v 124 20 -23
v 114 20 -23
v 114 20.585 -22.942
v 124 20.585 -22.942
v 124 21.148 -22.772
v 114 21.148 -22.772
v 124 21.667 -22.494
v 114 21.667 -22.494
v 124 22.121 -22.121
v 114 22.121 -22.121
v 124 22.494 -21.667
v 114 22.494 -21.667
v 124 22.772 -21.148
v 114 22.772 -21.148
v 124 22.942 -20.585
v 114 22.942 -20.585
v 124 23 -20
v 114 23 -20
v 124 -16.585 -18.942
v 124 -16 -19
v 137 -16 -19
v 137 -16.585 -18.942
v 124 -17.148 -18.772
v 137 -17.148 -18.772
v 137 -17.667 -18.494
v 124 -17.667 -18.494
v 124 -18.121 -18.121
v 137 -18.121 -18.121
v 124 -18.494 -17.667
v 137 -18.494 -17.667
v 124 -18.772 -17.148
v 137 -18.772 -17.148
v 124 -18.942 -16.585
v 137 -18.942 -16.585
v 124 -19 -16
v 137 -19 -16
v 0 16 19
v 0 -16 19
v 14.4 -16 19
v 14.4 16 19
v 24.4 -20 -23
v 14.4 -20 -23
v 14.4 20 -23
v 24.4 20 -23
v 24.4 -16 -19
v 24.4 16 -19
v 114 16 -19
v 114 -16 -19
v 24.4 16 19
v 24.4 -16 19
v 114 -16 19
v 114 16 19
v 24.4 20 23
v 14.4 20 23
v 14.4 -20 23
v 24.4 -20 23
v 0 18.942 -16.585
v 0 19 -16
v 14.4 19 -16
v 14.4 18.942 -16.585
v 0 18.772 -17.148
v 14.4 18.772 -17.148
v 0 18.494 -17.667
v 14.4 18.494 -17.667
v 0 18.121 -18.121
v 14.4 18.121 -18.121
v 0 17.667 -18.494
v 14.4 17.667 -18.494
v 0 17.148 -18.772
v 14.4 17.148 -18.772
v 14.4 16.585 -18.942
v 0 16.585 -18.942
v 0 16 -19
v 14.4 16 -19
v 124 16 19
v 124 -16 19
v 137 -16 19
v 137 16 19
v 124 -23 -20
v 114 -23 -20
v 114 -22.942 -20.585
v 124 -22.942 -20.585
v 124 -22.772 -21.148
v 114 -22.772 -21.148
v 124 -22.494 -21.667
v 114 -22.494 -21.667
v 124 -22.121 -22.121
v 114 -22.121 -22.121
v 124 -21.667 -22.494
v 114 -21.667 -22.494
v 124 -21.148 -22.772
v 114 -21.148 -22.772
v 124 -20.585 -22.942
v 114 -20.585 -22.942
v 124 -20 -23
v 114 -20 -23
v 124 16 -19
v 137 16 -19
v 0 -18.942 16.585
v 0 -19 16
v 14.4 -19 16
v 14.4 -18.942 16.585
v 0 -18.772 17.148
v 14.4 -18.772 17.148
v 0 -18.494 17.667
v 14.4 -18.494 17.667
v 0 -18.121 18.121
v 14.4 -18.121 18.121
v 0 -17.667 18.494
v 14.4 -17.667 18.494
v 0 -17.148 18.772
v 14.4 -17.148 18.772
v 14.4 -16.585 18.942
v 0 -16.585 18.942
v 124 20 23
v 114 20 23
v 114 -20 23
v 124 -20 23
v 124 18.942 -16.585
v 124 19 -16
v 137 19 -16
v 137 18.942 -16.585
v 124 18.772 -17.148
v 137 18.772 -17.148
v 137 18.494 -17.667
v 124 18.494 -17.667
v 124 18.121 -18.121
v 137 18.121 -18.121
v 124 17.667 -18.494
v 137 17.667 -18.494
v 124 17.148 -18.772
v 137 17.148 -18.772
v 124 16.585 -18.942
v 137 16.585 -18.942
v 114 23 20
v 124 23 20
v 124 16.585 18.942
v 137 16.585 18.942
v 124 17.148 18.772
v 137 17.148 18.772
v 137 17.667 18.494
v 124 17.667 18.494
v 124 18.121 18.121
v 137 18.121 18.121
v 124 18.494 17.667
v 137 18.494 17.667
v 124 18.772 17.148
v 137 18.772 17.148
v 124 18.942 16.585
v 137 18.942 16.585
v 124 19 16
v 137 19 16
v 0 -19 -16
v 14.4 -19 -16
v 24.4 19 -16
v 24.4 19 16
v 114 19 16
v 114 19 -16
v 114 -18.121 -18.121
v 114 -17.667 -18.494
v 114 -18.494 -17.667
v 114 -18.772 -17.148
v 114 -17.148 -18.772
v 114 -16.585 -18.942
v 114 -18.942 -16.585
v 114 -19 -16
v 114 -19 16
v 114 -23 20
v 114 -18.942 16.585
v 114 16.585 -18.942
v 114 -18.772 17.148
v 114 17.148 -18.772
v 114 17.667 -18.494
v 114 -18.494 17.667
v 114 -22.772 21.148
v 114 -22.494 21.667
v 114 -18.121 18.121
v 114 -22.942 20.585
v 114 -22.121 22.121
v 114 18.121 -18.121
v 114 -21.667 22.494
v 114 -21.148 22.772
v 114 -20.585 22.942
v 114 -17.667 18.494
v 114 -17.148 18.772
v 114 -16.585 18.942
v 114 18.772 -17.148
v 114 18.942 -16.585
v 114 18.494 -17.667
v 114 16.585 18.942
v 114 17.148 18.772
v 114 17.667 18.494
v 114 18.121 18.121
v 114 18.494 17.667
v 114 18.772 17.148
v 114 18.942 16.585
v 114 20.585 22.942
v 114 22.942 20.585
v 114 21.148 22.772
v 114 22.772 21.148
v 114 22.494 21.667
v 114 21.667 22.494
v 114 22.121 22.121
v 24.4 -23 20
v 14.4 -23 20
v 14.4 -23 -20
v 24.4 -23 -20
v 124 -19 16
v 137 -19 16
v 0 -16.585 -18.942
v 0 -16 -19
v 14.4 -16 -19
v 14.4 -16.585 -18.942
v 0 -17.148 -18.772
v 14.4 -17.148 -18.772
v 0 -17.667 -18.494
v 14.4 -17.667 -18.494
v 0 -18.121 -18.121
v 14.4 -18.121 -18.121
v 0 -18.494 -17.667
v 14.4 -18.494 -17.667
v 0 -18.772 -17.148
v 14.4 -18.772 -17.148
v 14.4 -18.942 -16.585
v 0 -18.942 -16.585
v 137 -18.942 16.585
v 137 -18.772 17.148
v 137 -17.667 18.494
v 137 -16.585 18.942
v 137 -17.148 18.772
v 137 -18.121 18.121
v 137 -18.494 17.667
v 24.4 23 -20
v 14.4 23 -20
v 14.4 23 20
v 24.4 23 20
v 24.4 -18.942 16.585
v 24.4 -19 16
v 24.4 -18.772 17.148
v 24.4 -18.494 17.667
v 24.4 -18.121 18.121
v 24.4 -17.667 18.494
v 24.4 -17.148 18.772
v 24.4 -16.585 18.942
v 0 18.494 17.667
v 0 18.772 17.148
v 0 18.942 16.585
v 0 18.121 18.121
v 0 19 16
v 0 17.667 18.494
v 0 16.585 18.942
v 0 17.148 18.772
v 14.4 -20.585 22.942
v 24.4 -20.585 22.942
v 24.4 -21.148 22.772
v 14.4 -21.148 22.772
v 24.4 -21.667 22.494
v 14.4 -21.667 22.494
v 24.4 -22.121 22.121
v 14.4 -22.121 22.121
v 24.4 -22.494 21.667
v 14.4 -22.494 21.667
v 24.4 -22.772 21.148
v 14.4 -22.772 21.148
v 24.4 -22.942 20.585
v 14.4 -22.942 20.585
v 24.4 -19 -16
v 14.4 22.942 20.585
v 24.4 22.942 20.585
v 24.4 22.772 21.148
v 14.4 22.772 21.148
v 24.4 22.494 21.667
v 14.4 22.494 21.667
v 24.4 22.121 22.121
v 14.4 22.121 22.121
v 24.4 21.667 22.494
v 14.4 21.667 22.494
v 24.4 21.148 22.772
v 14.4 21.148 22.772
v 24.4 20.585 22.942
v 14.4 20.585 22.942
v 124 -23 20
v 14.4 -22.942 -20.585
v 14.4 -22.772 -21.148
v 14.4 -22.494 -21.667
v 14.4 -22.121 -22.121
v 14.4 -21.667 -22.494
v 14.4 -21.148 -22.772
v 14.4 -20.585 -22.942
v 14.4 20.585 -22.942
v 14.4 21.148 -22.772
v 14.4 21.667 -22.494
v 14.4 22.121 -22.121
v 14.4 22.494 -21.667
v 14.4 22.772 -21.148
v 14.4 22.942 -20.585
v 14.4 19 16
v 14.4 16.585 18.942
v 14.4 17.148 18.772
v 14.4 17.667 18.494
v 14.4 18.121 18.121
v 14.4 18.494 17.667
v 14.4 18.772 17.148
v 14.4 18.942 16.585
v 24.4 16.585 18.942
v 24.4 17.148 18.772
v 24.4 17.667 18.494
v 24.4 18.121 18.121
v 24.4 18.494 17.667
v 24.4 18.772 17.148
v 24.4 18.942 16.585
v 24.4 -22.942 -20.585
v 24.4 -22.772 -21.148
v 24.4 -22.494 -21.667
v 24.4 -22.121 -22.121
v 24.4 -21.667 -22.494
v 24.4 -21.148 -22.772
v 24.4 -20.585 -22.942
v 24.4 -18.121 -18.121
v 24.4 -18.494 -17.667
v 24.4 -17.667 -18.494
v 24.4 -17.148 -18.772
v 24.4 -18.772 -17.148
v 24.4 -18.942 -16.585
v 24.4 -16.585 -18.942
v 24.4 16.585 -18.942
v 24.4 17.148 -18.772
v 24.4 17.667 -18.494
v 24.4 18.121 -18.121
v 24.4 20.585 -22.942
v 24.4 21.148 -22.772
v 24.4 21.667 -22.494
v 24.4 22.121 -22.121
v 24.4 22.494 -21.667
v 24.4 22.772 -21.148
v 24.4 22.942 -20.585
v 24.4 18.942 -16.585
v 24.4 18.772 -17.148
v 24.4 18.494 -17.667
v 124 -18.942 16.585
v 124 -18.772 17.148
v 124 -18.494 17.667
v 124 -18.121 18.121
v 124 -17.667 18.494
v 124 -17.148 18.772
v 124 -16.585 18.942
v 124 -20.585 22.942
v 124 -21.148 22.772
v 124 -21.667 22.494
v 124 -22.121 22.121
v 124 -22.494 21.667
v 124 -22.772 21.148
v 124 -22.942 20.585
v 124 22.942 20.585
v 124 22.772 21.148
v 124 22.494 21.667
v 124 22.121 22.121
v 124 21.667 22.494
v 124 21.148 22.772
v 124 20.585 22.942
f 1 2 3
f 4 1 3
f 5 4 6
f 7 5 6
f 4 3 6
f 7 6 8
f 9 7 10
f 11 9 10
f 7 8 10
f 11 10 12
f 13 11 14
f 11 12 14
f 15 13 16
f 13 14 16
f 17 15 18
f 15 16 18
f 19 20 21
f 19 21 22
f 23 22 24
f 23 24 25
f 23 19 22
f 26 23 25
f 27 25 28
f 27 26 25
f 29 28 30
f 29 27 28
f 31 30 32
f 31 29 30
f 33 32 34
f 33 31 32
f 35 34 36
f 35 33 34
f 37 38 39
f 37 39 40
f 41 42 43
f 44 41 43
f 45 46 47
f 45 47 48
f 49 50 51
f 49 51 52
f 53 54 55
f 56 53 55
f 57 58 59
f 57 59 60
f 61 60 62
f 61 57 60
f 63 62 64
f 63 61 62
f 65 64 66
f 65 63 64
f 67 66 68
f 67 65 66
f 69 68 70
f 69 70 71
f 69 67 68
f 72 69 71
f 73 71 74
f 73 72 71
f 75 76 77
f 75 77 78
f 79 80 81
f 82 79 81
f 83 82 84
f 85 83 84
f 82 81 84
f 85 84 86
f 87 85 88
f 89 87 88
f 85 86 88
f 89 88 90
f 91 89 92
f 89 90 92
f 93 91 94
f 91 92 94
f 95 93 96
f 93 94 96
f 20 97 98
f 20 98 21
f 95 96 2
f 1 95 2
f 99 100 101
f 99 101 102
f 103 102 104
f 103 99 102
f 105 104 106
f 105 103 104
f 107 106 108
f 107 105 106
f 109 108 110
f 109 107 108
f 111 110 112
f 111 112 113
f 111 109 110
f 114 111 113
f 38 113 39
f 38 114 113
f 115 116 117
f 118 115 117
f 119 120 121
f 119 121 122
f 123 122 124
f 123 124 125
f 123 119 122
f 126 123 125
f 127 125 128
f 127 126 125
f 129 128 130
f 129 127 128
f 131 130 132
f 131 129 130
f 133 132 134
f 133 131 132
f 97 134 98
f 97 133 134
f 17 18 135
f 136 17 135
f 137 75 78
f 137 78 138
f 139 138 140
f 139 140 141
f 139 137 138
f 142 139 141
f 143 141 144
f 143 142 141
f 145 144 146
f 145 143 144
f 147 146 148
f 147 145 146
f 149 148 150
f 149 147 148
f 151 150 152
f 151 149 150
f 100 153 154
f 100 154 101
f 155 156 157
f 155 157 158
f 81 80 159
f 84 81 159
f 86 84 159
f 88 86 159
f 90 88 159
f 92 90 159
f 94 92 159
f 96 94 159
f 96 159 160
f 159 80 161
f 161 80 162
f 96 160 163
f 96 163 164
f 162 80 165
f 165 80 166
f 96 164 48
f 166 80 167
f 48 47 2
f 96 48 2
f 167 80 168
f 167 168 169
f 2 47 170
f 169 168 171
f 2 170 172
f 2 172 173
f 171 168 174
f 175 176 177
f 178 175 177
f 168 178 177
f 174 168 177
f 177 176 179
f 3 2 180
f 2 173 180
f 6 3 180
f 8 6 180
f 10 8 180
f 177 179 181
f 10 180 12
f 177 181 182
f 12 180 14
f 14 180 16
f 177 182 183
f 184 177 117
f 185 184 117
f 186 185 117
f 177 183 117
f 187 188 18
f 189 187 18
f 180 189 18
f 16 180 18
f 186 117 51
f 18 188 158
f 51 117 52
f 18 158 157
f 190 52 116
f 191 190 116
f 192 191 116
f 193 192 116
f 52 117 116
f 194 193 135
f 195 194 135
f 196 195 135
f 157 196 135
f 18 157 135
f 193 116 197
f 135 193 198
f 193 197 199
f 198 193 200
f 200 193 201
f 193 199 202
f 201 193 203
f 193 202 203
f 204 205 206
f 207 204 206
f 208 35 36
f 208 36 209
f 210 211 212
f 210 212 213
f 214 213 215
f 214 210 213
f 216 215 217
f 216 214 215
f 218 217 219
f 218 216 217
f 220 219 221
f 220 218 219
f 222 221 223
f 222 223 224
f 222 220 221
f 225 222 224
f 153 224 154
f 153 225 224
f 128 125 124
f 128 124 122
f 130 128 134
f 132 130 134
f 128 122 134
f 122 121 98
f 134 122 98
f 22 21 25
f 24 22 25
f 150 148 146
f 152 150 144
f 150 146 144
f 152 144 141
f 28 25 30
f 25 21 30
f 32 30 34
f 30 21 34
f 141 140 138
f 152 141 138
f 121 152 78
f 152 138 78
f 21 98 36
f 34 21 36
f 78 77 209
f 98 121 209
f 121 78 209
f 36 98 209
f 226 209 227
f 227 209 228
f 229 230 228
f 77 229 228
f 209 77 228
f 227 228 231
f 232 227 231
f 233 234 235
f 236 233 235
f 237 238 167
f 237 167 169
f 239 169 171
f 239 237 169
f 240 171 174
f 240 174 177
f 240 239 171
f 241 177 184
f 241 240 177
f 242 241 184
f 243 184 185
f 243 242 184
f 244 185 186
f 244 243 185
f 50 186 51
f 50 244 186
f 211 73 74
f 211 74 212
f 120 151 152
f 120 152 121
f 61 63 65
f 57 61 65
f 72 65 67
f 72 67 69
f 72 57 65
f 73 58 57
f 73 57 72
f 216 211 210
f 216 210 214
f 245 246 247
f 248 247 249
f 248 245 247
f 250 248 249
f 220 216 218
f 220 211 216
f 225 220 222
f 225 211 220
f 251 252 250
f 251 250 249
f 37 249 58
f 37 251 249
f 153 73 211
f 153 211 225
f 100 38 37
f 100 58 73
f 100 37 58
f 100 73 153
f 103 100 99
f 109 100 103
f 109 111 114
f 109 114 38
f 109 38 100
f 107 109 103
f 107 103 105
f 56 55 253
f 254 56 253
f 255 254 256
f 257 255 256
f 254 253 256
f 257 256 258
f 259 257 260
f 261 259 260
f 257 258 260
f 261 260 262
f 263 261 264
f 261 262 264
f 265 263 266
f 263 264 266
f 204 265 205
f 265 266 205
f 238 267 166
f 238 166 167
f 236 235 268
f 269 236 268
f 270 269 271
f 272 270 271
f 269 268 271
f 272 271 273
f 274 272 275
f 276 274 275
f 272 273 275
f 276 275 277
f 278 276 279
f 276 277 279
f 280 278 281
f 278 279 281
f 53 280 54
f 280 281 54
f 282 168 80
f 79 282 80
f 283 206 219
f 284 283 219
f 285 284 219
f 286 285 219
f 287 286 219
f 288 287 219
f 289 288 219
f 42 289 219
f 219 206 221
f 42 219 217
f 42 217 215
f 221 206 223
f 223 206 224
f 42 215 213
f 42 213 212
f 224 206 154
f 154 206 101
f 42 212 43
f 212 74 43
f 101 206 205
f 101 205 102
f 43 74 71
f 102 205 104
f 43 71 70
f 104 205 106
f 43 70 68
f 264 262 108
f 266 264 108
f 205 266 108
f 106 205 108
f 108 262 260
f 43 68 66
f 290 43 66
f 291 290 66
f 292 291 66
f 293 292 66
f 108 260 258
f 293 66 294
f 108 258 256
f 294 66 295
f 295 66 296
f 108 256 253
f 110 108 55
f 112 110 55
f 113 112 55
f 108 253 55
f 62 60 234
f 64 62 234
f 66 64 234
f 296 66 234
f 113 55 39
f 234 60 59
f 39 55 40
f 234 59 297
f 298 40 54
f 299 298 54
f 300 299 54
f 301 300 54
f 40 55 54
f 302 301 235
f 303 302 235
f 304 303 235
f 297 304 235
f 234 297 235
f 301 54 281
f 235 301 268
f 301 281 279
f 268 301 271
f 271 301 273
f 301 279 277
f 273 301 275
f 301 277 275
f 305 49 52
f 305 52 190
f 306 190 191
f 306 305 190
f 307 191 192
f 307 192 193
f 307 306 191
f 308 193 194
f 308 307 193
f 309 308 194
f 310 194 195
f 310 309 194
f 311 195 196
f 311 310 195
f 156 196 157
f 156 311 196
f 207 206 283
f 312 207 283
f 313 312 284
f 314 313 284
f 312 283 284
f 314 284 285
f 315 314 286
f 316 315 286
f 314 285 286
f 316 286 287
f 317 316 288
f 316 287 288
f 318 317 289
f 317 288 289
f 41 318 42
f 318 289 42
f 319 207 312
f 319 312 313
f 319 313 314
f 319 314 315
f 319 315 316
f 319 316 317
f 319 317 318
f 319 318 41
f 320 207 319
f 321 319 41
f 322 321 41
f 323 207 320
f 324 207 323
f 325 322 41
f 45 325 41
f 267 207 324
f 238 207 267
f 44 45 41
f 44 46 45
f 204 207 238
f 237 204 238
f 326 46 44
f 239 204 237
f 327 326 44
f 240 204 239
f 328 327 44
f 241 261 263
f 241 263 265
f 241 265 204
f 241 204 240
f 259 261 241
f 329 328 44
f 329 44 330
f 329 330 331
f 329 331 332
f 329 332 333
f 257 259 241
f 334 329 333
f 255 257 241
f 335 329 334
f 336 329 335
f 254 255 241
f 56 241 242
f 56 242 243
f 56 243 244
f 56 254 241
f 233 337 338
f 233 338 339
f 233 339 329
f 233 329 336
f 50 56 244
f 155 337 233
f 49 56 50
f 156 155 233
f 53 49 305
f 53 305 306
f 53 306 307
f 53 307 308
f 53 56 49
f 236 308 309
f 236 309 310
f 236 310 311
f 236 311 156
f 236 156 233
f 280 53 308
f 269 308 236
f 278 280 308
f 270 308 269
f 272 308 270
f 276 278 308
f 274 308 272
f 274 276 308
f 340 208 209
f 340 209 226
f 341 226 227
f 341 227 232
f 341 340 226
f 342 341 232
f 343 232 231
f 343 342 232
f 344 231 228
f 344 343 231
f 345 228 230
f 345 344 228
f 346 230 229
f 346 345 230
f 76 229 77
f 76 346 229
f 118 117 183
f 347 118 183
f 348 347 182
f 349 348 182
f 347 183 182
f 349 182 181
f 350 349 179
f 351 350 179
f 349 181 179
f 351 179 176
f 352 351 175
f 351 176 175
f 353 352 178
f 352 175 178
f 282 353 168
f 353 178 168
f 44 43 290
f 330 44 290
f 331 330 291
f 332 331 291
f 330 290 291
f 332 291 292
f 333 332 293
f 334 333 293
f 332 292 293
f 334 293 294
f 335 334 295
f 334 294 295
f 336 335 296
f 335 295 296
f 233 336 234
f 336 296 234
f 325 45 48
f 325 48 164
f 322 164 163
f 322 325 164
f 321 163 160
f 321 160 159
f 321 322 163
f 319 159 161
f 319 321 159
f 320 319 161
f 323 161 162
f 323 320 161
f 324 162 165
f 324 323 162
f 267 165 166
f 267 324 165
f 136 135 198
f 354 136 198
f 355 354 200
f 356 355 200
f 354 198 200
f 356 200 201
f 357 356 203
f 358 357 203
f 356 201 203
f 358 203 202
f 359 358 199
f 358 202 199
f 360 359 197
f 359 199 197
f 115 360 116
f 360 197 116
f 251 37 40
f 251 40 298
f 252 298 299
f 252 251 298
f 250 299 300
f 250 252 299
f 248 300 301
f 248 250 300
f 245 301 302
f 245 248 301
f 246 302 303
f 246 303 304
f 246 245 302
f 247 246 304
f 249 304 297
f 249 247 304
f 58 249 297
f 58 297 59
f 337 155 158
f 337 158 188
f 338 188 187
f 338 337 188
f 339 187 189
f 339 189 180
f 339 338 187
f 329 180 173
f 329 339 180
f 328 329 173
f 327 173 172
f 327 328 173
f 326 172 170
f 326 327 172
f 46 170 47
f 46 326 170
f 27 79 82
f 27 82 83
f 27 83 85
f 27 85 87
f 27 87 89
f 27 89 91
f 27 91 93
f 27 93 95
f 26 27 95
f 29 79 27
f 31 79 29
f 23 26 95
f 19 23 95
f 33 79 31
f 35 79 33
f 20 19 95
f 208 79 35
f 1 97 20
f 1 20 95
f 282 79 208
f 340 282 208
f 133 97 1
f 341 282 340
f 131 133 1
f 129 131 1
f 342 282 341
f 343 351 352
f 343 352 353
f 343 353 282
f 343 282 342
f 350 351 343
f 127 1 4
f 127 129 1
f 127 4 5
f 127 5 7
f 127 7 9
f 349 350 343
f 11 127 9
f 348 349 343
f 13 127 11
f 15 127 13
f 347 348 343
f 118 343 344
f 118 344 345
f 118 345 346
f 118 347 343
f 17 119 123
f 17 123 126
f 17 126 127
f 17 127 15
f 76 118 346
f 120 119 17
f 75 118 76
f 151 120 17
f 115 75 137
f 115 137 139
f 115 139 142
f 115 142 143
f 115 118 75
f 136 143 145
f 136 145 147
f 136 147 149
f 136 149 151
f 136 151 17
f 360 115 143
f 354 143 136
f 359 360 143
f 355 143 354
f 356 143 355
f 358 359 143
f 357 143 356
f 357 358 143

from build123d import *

# Parameters (mm, degrees)
EXTRUDE_1_DEPTH = 137
EXTRUDE_START   = -14.4
EXTRUDE_2_DEPTH = 10
EXTRUDE_START_2 = -114
EXTRUDE_3_DEPTH = 10


with BuildPart() as part:
    # 스케치1 → 보스-돌출1 (new body)
    with BuildSketch(Plane.YZ):
        with BuildLine():
            Line((-16, 19), (16, 19))
            ThreePointArc((16, 19), (18.121320344, 18.121320344), (19, 16))
            Line((19, 16), (19, -16))
            ThreePointArc((19, -16), (18.121320344, -18.121320344), (16, -19))
            Line((16, -19), (-16, -19))
            ThreePointArc((-16, -19), (-18.121320344, -18.121320344), (-19, -16))
            Line((-19, -16), (-19, 16))
            ThreePointArc((-19, 16), (-18.121320344, 18.121320344), (-16, 19))
        make_face()
    extrude(amount=EXTRUDE_1_DEPTH)

    # 스케치2 → 보스-돌출2 (add)
    with BuildSketch(Plane(origin=(0, 0, 0), x_dir=(0, -1, 0), z_dir=(-1, 0, 0)).offset(EXTRUDE_START)):
        with BuildLine():
            Line((-20, 23), (20, 23))
            ThreePointArc((20, 23), (22.121320344, 22.121320344), (23, 20))
            Line((23, 20), (23, -20))
            ThreePointArc((23, -20), (22.121320344, -22.121320344), (20, -23))
            Line((20, -23), (-20, -23))
            ThreePointArc((-20, -23), (-22.121320344, -22.121320344), (-23, -20))
            Line((-23, -20), (-23, 20))
            ThreePointArc((-23, 20), (-22.121320344, 22.121320344), (-20, 23))
        make_face()
    extrude(amount=-EXTRUDE_2_DEPTH)

    # 스케치2<2> → 보스-돌출3 (add)
    with BuildSketch(Plane(origin=(0, 0, 0), x_dir=(0, -1, 0), z_dir=(-1, 0, 0)).offset(EXTRUDE_START_2)):
        with BuildLine():
            Line((-20, 23), (20, 23))
            ThreePointArc((20, 23), (22.121320344, 22.121320344), (23, 20))
            Line((23, 20), (23, -20))
            ThreePointArc((23, -20), (22.121320344, -22.121320344), (20, -23))
            Line((20, -23), (-20, -23))
            ThreePointArc((-20, -23), (-22.121320344, -22.121320344), (-23, -20))
            Line((-23, -20), (-23, 20))
            ThreePointArc((-23, 20), (-22.121320344, 22.121320344), (-20, 23))
        make_face()
    extrude(amount=-EXTRUDE_3_DEPTH)


solid = part.part
